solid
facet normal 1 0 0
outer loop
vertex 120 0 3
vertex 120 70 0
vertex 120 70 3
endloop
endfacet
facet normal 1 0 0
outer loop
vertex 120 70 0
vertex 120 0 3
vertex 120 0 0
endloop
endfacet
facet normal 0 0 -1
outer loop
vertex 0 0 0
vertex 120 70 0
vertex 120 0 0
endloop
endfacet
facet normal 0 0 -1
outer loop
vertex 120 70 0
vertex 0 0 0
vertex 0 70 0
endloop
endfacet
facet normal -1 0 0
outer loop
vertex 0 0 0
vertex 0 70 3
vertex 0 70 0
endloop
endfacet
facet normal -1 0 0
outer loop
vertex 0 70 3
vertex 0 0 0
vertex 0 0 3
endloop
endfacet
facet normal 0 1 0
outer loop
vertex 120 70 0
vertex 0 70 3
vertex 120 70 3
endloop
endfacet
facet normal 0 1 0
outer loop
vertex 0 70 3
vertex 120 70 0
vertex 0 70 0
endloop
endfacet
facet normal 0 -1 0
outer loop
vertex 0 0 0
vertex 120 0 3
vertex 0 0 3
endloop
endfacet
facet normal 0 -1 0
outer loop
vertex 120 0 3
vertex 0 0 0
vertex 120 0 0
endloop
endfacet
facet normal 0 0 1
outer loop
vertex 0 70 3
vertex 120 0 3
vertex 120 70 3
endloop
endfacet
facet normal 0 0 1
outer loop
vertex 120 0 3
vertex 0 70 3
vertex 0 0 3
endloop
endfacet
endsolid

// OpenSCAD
// Open-top rectangular buffer tank for a mini horizontal gel-electrophoresis box, with a
// central raised platform that spans the full width and creates two buffer chambers, and
// horizontal electrode holes through each end wall. NOVEL general part.
//

tank_l = 120;
tank_w = 70;
tank_h = 40;
wall   = 3;
floor  = 3;
platform_t = 10;
electrode_d = 2;

$fn = 48;

inner_w = tank_w - 2 * wall;
site    = (tank_l / 2) - 60;                 // centre the platform in X, leaving 60 mm of space at each end

difference() {
    cube([tank_l, tank_w, tank_h]);                       // outer block
    translate([0, 0, floor]) cube([tank_l, tank_w, tank_h - floor]);   // hollow: remove the volume below the floor
    translate([site, 0, tank_h - platform_t]) cube([120, tank_w, platform_t]);           // the raised platform (spans the full width)
    for (x = [-1, 1])
        translate([x * tank_l / 2, 0, tank_h - 1]) cylinder(h = tank_h + 2, d = electrode_d);                 // electrode holes, horizontal along X, near the top wall
}
